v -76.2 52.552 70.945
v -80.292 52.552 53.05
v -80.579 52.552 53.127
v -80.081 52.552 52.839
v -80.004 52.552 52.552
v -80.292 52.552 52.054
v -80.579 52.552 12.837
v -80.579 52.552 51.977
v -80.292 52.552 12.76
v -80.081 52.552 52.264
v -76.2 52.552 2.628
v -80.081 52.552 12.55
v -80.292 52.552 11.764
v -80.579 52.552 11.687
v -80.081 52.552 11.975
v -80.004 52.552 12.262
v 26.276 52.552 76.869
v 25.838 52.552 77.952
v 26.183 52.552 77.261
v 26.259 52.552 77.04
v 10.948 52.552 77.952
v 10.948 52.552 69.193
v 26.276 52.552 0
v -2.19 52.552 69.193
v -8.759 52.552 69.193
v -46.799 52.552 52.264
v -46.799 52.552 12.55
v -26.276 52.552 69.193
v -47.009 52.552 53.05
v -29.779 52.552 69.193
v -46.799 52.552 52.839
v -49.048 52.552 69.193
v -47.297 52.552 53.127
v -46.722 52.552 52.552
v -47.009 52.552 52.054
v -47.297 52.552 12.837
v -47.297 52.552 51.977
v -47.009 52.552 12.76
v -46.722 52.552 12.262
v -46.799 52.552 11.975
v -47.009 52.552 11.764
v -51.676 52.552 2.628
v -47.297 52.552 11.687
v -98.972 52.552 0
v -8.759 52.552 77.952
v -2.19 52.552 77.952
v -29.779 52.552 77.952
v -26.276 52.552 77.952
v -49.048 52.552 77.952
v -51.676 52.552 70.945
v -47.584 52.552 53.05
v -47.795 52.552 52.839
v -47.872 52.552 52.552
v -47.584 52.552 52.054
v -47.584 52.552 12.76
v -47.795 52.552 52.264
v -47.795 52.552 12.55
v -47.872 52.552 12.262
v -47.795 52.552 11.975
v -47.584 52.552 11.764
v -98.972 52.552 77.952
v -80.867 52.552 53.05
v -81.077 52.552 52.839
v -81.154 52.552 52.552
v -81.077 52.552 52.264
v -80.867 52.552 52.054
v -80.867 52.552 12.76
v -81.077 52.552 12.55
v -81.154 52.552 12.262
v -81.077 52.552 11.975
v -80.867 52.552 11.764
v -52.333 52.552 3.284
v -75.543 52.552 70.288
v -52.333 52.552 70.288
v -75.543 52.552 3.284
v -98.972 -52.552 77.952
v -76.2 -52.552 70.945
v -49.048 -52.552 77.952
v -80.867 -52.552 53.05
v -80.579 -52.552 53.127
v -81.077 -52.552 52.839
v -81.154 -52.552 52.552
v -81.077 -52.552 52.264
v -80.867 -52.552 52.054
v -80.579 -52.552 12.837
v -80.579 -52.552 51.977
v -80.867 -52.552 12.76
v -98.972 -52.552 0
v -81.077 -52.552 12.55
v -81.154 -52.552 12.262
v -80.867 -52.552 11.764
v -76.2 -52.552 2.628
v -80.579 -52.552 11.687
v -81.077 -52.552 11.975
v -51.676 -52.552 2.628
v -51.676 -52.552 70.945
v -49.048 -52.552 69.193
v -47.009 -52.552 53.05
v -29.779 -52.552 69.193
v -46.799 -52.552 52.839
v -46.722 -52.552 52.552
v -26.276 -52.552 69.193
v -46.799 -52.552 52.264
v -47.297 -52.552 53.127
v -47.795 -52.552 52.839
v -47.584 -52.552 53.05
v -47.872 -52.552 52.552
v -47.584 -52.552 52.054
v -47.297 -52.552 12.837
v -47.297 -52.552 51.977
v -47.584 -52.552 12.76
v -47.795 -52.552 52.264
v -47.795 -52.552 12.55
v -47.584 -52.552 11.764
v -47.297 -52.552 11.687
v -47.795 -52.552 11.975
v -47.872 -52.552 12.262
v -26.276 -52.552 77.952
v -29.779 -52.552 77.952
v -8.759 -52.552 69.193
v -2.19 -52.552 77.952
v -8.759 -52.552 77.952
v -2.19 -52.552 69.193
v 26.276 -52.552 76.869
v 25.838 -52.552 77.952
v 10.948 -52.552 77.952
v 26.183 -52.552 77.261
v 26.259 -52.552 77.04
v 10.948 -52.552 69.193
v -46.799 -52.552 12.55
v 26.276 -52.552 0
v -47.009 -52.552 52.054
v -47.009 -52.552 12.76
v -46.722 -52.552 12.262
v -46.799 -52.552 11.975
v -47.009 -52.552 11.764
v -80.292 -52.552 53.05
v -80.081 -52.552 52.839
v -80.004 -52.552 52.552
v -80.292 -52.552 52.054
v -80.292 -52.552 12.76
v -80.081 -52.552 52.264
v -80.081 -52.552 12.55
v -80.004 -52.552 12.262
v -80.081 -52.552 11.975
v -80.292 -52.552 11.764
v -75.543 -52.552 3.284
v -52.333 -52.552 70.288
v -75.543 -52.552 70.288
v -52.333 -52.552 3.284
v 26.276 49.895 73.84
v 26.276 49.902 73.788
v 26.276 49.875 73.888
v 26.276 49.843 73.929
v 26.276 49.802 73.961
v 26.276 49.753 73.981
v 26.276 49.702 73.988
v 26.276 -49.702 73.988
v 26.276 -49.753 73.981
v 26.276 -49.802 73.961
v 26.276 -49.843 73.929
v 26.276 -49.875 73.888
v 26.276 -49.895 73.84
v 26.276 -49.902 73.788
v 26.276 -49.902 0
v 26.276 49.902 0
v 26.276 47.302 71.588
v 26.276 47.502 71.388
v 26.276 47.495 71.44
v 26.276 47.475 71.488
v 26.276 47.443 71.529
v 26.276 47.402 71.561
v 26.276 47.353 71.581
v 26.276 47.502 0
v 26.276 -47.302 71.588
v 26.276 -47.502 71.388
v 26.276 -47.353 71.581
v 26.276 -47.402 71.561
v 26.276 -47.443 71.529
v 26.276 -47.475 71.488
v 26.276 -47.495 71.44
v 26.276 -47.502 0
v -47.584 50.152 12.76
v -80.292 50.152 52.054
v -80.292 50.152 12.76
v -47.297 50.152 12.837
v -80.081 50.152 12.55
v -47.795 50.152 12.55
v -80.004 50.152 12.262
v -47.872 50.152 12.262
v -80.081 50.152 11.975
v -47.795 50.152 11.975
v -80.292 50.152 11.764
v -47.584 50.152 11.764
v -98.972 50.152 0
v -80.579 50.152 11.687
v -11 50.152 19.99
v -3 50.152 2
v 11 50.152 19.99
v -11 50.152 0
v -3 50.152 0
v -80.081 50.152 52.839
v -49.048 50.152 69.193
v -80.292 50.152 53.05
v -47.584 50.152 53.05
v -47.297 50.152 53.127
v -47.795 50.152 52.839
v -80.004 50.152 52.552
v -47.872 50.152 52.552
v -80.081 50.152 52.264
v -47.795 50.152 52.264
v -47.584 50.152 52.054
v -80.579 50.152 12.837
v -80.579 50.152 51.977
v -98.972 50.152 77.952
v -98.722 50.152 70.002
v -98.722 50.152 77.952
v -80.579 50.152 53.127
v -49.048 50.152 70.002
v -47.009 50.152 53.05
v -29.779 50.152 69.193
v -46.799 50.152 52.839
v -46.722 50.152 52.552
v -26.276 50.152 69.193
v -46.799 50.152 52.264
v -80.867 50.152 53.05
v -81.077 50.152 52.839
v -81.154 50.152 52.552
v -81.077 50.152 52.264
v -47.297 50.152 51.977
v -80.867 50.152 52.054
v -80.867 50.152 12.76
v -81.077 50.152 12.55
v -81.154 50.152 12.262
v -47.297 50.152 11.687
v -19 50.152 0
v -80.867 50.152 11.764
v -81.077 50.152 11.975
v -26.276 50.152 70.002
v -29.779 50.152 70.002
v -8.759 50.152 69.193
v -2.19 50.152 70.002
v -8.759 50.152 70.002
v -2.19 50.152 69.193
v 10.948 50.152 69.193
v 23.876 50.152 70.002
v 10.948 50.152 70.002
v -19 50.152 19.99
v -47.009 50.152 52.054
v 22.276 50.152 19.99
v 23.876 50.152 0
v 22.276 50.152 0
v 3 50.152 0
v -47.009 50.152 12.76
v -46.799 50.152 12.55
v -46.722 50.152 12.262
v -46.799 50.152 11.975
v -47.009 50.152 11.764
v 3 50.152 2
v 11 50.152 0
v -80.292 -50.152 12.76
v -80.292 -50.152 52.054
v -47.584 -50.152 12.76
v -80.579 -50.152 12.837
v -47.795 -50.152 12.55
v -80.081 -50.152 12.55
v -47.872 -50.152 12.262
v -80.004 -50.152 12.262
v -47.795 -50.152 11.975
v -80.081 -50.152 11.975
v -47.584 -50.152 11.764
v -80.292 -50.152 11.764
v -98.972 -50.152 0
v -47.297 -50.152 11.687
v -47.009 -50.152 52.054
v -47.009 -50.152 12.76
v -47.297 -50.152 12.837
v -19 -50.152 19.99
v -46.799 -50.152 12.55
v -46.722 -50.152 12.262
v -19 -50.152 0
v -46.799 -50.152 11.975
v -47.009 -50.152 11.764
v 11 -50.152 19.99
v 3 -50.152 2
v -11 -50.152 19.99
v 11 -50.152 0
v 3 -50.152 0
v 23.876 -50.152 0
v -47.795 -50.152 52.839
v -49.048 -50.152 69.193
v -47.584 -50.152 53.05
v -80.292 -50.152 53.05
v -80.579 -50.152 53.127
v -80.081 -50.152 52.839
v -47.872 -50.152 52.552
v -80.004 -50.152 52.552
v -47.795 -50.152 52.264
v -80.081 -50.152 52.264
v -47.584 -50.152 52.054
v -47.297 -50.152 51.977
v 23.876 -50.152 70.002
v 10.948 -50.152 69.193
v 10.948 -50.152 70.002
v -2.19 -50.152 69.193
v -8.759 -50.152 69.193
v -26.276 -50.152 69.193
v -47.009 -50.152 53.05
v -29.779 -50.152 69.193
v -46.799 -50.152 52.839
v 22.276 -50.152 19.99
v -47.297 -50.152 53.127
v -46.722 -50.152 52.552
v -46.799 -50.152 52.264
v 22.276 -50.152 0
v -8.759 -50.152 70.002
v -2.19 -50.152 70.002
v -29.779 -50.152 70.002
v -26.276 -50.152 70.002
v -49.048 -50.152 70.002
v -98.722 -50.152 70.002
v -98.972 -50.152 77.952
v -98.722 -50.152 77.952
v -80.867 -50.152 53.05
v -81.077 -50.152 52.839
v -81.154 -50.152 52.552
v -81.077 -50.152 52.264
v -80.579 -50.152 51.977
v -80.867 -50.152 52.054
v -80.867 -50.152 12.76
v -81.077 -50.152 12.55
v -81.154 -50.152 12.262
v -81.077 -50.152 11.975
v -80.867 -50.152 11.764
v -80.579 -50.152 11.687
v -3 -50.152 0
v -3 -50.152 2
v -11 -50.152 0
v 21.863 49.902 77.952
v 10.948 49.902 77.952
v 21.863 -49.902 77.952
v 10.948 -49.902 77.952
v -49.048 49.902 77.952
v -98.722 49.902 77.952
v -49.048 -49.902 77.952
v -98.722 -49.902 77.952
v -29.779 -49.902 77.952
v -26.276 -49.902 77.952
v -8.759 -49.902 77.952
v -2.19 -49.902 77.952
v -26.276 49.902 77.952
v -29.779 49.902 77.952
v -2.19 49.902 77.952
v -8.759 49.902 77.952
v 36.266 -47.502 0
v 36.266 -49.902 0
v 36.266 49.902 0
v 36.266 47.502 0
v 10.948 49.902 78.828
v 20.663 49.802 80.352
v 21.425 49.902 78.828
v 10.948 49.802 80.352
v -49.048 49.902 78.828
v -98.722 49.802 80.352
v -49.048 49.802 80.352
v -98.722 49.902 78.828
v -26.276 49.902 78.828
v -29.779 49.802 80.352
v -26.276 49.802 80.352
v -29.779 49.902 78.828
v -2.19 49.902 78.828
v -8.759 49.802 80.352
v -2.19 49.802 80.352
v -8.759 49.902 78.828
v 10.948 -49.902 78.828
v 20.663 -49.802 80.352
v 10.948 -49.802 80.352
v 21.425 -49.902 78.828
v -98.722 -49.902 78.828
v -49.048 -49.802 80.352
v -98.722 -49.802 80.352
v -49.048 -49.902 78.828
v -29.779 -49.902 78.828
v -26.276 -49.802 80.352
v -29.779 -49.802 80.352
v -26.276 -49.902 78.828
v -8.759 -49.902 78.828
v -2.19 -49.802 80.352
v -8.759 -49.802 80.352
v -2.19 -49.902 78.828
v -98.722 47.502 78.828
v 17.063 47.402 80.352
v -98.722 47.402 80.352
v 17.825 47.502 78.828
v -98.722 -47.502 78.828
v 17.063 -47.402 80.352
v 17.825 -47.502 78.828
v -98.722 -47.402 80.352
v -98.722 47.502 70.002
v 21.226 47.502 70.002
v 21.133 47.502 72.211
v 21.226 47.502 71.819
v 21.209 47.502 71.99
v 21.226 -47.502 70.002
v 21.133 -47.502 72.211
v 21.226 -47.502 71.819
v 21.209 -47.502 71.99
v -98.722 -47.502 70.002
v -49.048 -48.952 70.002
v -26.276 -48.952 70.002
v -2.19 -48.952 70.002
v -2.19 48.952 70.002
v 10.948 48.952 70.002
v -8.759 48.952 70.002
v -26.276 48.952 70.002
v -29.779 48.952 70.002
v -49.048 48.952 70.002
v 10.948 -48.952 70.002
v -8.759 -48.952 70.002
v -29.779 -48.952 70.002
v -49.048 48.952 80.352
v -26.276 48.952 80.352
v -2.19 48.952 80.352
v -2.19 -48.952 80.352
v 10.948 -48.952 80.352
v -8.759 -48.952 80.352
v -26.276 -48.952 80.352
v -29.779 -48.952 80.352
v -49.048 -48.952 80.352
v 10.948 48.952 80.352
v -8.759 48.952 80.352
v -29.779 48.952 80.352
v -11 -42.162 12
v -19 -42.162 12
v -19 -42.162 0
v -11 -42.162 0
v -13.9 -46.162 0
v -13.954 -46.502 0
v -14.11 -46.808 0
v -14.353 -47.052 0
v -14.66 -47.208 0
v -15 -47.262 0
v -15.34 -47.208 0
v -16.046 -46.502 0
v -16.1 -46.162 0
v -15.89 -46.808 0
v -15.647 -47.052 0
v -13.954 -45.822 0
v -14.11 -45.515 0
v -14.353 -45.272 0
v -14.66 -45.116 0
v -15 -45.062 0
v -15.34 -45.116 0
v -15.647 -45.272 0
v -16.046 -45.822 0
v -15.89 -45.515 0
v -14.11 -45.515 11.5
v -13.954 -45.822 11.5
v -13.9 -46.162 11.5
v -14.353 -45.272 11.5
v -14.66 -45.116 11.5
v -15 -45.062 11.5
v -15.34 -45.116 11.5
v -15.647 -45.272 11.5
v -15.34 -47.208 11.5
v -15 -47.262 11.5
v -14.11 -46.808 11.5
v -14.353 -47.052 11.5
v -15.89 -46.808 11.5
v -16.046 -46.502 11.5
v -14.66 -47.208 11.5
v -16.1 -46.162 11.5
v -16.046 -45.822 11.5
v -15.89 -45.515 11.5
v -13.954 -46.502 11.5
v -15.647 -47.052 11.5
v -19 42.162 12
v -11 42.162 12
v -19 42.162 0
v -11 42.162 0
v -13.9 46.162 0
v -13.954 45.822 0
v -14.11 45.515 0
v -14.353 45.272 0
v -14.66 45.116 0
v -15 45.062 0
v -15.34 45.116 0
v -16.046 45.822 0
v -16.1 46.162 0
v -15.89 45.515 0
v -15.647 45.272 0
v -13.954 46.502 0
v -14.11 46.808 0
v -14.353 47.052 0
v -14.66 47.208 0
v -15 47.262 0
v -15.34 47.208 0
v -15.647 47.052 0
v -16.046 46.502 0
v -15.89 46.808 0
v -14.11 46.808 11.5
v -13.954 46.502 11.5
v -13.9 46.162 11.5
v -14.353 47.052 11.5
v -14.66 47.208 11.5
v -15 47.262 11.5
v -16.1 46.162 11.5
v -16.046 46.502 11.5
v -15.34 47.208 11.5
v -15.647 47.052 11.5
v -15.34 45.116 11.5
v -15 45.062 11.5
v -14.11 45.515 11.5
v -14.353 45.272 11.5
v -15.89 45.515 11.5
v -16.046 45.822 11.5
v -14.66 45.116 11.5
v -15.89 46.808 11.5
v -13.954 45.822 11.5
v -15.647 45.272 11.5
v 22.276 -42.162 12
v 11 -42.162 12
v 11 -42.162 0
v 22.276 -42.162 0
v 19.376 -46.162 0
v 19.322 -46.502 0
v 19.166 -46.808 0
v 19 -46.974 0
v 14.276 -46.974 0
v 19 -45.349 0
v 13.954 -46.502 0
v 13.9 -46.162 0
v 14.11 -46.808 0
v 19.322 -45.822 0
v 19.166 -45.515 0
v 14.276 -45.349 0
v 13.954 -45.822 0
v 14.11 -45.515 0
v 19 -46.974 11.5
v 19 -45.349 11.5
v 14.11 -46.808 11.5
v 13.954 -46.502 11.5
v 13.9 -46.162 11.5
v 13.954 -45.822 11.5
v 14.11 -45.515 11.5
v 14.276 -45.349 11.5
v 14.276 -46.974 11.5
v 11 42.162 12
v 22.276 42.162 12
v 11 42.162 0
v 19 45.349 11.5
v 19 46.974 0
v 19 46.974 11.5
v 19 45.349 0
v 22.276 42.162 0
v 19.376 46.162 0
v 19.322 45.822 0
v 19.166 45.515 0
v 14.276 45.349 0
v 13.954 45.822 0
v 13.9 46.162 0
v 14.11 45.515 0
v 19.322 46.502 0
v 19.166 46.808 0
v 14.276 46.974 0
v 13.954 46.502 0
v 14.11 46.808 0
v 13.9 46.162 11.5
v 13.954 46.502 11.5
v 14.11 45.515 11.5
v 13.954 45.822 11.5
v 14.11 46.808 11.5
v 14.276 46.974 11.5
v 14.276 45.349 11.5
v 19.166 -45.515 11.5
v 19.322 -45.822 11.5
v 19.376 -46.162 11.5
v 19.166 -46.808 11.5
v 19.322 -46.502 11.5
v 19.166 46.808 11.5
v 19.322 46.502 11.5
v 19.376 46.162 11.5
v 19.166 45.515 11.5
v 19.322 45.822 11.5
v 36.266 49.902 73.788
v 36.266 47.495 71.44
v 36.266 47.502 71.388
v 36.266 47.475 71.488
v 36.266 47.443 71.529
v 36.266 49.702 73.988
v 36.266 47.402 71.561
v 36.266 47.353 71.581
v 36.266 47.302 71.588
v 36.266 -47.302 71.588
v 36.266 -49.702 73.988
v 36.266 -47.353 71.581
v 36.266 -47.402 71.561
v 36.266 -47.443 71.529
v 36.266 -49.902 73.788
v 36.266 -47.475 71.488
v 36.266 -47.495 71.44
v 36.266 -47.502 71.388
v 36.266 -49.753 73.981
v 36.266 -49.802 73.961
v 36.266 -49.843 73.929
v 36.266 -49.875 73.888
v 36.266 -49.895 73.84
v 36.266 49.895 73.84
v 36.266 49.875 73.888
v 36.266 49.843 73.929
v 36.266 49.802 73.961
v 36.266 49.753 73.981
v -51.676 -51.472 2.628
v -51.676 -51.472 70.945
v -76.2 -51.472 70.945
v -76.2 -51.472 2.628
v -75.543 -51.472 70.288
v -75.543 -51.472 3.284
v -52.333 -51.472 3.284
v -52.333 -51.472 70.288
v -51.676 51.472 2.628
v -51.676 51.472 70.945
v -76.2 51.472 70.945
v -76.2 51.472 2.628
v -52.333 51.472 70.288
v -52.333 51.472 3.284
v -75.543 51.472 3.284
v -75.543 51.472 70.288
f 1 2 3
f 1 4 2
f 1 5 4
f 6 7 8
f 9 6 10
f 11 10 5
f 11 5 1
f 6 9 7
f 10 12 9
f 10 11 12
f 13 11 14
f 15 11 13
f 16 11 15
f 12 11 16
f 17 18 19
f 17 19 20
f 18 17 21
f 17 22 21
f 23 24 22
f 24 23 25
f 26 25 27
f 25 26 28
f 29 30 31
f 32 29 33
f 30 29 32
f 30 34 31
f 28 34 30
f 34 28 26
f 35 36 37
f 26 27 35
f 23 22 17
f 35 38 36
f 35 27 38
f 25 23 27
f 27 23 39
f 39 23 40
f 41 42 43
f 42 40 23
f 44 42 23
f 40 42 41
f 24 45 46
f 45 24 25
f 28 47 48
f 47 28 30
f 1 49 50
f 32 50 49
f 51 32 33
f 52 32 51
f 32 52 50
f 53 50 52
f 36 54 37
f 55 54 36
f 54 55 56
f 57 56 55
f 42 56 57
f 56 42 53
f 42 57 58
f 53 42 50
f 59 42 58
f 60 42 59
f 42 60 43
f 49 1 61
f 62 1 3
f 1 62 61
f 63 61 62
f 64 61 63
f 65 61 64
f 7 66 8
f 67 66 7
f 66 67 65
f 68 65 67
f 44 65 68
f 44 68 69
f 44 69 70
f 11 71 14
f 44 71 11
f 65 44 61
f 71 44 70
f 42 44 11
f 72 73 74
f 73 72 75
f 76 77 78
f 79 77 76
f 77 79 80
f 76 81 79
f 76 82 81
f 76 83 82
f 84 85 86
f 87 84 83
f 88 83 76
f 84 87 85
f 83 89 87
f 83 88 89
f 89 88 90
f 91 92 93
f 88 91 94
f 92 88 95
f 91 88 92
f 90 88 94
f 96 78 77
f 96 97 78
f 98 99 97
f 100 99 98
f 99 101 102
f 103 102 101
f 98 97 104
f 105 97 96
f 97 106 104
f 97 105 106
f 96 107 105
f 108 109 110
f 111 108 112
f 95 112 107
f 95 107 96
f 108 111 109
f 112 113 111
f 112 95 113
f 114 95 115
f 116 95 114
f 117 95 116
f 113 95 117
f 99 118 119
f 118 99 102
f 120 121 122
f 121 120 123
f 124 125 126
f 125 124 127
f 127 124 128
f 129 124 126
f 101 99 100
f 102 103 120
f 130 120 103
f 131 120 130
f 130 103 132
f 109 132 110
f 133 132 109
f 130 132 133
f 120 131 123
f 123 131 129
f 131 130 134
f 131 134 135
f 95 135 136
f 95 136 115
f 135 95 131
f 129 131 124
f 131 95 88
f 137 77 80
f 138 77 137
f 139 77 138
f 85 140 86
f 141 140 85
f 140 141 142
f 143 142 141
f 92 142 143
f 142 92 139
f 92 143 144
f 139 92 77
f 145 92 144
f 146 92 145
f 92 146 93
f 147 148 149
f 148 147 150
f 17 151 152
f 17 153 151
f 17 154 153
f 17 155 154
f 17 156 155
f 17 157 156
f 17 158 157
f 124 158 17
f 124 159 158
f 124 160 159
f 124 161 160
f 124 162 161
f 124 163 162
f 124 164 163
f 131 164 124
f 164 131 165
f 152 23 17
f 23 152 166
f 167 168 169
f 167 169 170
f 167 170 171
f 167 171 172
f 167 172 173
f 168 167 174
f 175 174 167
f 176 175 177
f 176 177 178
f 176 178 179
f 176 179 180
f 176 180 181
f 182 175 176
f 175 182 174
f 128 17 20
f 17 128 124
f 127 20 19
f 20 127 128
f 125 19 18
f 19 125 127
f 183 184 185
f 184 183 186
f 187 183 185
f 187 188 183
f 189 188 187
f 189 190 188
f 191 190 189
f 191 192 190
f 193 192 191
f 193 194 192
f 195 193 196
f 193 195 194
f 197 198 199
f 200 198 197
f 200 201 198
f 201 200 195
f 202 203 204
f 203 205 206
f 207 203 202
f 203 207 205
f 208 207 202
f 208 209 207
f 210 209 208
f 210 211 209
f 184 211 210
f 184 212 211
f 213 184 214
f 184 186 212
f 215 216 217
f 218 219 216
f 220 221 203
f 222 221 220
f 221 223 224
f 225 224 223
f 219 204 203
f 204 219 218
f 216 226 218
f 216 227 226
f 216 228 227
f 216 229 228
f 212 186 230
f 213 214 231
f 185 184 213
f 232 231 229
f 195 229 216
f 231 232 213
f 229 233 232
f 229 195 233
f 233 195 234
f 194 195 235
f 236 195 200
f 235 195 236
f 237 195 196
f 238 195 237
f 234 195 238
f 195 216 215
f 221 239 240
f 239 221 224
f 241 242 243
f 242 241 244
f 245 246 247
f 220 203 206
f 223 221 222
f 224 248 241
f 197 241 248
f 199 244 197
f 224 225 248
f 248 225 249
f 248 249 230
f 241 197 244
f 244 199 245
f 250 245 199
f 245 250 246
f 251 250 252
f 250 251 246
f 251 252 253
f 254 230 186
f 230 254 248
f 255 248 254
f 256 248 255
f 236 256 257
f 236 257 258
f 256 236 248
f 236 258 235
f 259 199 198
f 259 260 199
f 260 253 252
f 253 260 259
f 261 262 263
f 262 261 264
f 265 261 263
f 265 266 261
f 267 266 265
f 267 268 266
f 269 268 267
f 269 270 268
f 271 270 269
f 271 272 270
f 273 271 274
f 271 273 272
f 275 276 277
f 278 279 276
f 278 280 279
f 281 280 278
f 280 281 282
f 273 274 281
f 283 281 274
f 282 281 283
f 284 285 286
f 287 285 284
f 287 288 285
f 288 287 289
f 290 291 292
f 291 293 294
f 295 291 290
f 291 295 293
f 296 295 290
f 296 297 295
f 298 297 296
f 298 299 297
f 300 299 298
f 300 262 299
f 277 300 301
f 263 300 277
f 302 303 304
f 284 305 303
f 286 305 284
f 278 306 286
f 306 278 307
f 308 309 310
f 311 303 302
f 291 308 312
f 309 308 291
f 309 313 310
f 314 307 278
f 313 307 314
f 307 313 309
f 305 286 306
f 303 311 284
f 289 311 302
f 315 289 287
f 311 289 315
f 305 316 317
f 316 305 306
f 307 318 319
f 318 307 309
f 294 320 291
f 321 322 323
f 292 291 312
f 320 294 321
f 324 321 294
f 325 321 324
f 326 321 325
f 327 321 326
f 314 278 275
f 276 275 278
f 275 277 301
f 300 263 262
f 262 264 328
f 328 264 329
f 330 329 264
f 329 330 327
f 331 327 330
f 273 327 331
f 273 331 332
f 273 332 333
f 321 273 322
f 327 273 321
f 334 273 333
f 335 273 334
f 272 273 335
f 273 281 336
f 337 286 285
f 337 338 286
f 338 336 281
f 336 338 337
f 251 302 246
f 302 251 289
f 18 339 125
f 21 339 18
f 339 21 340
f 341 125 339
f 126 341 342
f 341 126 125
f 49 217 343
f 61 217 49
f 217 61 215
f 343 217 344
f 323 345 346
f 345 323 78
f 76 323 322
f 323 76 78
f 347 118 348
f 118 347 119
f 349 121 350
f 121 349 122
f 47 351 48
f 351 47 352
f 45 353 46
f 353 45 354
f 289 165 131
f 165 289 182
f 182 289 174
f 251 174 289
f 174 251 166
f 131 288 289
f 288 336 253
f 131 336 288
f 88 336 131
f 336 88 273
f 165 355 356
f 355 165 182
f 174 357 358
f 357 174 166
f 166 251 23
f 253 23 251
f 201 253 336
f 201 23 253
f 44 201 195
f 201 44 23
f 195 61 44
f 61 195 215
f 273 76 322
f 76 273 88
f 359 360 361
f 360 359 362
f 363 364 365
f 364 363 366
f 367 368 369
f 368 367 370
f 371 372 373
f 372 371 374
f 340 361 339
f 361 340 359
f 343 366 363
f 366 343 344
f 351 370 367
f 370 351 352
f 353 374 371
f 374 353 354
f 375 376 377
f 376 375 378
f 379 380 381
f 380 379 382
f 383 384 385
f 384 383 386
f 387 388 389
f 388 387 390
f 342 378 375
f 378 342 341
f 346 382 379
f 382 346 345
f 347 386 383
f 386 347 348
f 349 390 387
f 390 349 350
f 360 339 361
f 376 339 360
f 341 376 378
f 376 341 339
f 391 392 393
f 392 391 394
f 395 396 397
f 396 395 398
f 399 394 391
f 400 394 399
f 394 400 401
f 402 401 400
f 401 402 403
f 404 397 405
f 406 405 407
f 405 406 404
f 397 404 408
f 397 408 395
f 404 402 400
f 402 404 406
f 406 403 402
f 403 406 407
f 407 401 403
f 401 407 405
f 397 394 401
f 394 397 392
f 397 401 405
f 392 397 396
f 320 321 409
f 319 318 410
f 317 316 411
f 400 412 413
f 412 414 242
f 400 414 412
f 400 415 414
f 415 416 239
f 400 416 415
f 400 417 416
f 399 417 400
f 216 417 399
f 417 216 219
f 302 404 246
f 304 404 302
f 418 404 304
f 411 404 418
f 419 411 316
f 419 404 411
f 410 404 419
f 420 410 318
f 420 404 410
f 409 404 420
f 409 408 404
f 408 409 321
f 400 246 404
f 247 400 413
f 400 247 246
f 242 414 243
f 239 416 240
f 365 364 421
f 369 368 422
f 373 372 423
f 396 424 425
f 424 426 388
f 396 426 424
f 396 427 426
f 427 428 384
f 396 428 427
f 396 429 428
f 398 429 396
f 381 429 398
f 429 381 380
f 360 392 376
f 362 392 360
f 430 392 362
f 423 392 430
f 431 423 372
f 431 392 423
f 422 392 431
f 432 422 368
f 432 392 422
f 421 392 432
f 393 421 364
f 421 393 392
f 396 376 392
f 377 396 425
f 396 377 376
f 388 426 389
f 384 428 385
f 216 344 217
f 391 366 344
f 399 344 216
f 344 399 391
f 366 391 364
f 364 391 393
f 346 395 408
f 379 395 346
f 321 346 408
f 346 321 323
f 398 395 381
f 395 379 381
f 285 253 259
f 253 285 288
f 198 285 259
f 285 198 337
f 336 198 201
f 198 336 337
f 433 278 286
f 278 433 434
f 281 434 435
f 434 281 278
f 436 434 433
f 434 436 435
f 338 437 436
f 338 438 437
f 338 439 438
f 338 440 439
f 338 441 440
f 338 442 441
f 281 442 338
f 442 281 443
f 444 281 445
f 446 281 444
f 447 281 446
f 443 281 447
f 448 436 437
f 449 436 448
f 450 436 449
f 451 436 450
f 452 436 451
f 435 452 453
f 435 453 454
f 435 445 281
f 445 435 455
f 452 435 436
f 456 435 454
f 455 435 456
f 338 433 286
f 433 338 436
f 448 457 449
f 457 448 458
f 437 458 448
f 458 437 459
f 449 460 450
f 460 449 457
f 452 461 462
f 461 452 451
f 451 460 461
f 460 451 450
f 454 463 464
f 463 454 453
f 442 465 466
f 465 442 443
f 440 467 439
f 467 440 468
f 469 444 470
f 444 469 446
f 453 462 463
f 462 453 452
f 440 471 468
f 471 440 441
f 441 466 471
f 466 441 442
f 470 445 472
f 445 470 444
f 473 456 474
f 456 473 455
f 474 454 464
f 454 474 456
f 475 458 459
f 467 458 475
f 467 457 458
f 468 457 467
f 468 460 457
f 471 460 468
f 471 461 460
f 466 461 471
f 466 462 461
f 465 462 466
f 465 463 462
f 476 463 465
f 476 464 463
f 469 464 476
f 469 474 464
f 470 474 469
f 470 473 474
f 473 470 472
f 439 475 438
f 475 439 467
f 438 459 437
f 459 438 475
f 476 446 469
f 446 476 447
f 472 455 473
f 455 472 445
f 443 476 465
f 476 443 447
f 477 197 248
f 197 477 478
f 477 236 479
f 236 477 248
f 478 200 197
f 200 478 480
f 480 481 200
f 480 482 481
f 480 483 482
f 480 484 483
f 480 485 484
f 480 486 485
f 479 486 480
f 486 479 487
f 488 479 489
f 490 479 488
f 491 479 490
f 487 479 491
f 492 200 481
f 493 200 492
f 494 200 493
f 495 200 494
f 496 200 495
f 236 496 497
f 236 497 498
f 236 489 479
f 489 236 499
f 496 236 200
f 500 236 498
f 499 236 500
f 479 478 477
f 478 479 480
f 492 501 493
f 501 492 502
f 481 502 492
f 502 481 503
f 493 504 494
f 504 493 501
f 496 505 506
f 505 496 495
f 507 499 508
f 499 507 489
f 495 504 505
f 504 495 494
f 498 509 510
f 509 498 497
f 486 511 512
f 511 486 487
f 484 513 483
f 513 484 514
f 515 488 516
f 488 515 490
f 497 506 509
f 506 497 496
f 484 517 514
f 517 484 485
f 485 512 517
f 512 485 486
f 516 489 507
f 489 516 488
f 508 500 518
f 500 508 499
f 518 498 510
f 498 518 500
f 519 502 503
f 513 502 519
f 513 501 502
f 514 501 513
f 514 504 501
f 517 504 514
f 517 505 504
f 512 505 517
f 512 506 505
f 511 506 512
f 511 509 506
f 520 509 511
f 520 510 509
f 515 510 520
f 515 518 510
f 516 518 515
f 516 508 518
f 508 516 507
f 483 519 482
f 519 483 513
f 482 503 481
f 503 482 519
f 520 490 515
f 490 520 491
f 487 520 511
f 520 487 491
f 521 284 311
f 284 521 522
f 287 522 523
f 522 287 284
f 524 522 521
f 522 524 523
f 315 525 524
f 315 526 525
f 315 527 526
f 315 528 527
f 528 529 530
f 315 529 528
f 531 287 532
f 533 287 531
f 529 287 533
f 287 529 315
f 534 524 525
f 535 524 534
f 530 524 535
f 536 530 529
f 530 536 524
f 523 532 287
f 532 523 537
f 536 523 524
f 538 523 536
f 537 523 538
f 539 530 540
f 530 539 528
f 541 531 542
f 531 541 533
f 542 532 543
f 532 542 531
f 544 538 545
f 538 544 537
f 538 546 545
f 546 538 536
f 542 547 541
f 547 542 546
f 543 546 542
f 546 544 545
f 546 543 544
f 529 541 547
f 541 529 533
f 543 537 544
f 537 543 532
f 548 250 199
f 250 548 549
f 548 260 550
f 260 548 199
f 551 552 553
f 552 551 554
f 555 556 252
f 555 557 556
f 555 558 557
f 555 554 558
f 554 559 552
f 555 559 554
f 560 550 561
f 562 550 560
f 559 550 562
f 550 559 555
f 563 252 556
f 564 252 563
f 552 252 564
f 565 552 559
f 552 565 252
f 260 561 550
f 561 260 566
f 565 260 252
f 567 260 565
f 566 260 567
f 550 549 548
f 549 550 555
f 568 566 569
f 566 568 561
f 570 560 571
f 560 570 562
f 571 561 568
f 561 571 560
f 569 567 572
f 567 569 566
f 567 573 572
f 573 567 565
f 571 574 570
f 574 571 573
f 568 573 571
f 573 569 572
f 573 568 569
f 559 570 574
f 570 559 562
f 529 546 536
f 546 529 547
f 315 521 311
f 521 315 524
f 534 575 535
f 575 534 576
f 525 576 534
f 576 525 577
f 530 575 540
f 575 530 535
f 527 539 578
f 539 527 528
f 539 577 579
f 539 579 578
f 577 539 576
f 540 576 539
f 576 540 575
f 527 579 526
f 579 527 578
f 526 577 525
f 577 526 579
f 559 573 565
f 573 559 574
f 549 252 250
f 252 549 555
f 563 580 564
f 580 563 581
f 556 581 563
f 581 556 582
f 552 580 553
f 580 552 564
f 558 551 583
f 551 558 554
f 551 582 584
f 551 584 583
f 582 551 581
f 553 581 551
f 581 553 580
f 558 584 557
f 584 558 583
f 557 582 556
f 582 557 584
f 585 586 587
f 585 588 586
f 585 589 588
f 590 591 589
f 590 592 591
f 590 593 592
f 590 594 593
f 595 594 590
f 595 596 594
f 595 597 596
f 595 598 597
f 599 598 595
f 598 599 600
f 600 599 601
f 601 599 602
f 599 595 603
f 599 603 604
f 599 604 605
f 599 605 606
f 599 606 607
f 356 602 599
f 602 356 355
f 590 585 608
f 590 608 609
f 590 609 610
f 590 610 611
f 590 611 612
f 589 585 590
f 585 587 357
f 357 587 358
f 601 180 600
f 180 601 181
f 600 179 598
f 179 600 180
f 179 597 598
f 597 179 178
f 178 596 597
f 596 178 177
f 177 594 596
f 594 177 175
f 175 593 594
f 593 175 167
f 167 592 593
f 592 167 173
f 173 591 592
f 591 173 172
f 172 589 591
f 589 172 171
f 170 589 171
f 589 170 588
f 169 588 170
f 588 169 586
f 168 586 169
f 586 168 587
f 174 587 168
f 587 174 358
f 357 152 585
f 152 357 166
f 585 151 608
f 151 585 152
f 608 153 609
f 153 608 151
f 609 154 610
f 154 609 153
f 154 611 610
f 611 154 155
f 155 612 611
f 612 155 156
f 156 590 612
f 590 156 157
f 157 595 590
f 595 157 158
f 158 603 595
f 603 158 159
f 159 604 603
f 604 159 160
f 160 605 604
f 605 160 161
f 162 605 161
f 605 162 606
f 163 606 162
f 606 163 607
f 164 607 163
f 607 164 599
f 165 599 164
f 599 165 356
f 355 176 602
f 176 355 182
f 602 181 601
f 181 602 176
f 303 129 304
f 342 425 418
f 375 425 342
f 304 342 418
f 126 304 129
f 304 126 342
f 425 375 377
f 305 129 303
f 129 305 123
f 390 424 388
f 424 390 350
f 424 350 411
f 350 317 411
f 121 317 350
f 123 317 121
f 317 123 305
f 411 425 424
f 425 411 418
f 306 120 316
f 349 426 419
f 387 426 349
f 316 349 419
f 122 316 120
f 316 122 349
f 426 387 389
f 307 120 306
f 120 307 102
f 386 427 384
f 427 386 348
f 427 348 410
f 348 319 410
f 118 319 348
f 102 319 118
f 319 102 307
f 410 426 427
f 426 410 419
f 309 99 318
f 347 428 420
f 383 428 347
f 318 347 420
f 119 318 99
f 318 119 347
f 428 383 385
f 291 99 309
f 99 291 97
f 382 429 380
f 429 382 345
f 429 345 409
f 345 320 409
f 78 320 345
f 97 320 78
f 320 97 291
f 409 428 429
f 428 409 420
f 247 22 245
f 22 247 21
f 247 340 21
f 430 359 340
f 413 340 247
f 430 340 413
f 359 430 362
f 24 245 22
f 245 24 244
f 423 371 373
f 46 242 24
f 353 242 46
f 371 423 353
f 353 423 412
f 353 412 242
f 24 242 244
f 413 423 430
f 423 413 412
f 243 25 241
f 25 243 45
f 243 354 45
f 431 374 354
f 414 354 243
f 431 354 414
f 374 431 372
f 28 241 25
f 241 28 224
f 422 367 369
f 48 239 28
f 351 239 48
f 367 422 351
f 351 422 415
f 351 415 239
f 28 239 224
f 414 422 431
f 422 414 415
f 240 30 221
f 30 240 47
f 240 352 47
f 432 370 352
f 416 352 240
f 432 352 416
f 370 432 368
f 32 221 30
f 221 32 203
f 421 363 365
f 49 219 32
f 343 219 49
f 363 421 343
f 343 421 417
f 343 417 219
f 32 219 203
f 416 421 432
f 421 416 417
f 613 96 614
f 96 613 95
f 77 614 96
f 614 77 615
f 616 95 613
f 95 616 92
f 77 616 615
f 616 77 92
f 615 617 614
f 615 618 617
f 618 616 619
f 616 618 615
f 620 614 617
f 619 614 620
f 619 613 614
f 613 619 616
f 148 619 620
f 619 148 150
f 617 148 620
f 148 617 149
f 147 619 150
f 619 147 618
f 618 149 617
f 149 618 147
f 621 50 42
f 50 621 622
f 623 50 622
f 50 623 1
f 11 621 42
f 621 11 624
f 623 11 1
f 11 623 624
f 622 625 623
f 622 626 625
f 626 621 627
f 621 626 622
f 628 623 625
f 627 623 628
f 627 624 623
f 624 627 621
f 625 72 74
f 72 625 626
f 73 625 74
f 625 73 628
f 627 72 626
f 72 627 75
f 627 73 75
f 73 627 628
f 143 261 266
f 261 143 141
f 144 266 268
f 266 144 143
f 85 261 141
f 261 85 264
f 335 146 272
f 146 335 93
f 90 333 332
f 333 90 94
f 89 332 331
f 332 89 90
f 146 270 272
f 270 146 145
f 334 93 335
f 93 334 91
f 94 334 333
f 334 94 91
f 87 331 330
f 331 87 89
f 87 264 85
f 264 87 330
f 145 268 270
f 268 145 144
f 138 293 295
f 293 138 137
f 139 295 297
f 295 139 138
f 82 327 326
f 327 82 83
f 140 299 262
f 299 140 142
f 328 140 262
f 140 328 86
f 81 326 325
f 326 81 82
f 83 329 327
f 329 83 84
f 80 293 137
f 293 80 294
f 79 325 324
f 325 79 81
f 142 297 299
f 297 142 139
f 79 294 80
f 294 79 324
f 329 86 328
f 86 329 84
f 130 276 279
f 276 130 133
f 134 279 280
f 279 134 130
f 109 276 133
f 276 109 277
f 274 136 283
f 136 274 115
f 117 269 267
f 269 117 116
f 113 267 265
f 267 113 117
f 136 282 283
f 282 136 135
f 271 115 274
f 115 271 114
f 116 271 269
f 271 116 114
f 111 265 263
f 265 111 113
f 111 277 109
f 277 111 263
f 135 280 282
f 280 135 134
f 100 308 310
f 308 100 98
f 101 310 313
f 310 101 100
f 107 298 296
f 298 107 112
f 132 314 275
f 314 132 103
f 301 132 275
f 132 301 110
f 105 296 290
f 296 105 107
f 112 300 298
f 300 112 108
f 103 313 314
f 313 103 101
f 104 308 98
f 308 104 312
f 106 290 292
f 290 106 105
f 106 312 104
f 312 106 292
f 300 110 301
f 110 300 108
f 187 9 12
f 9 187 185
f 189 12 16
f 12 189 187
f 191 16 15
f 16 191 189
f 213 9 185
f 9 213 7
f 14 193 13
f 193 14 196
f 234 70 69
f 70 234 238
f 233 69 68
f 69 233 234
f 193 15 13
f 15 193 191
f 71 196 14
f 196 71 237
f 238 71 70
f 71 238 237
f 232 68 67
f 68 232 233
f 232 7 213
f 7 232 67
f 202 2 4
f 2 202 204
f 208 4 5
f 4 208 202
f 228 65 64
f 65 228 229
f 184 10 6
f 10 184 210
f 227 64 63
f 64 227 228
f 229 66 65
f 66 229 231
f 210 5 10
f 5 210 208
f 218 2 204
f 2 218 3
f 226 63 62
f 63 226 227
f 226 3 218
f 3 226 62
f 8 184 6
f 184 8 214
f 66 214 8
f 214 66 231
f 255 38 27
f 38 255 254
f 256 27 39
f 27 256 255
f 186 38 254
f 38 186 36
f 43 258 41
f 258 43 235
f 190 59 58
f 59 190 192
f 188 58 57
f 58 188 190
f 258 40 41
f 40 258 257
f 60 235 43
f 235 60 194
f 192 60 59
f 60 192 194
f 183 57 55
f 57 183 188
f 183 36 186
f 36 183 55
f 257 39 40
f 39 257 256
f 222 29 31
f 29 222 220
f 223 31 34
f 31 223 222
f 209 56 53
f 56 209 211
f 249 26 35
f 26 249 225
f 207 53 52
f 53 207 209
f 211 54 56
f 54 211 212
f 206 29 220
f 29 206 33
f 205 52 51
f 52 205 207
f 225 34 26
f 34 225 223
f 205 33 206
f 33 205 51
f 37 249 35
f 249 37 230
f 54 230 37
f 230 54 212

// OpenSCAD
// Milwaukee Road Little Joe, G scale 1-29 - print 4 of 20: body_4 - sides and ends, section 4 (print upright)
// Render (F6), export STL, print. Settings: ../../library/lj_params.scad
// Whole loco preview and notes: ../../MILW_LittleJoe_Main.scad
SCALE_SEL = "G";
LOCO_SEL = "E70";   // [E20, E21, E70, E71, E72, E73, E74, E75, E76, E77, E78, E79] the body and roof change for E20 / E21
include <../../library/lj_all.scad>
lj_plate("body_4");
